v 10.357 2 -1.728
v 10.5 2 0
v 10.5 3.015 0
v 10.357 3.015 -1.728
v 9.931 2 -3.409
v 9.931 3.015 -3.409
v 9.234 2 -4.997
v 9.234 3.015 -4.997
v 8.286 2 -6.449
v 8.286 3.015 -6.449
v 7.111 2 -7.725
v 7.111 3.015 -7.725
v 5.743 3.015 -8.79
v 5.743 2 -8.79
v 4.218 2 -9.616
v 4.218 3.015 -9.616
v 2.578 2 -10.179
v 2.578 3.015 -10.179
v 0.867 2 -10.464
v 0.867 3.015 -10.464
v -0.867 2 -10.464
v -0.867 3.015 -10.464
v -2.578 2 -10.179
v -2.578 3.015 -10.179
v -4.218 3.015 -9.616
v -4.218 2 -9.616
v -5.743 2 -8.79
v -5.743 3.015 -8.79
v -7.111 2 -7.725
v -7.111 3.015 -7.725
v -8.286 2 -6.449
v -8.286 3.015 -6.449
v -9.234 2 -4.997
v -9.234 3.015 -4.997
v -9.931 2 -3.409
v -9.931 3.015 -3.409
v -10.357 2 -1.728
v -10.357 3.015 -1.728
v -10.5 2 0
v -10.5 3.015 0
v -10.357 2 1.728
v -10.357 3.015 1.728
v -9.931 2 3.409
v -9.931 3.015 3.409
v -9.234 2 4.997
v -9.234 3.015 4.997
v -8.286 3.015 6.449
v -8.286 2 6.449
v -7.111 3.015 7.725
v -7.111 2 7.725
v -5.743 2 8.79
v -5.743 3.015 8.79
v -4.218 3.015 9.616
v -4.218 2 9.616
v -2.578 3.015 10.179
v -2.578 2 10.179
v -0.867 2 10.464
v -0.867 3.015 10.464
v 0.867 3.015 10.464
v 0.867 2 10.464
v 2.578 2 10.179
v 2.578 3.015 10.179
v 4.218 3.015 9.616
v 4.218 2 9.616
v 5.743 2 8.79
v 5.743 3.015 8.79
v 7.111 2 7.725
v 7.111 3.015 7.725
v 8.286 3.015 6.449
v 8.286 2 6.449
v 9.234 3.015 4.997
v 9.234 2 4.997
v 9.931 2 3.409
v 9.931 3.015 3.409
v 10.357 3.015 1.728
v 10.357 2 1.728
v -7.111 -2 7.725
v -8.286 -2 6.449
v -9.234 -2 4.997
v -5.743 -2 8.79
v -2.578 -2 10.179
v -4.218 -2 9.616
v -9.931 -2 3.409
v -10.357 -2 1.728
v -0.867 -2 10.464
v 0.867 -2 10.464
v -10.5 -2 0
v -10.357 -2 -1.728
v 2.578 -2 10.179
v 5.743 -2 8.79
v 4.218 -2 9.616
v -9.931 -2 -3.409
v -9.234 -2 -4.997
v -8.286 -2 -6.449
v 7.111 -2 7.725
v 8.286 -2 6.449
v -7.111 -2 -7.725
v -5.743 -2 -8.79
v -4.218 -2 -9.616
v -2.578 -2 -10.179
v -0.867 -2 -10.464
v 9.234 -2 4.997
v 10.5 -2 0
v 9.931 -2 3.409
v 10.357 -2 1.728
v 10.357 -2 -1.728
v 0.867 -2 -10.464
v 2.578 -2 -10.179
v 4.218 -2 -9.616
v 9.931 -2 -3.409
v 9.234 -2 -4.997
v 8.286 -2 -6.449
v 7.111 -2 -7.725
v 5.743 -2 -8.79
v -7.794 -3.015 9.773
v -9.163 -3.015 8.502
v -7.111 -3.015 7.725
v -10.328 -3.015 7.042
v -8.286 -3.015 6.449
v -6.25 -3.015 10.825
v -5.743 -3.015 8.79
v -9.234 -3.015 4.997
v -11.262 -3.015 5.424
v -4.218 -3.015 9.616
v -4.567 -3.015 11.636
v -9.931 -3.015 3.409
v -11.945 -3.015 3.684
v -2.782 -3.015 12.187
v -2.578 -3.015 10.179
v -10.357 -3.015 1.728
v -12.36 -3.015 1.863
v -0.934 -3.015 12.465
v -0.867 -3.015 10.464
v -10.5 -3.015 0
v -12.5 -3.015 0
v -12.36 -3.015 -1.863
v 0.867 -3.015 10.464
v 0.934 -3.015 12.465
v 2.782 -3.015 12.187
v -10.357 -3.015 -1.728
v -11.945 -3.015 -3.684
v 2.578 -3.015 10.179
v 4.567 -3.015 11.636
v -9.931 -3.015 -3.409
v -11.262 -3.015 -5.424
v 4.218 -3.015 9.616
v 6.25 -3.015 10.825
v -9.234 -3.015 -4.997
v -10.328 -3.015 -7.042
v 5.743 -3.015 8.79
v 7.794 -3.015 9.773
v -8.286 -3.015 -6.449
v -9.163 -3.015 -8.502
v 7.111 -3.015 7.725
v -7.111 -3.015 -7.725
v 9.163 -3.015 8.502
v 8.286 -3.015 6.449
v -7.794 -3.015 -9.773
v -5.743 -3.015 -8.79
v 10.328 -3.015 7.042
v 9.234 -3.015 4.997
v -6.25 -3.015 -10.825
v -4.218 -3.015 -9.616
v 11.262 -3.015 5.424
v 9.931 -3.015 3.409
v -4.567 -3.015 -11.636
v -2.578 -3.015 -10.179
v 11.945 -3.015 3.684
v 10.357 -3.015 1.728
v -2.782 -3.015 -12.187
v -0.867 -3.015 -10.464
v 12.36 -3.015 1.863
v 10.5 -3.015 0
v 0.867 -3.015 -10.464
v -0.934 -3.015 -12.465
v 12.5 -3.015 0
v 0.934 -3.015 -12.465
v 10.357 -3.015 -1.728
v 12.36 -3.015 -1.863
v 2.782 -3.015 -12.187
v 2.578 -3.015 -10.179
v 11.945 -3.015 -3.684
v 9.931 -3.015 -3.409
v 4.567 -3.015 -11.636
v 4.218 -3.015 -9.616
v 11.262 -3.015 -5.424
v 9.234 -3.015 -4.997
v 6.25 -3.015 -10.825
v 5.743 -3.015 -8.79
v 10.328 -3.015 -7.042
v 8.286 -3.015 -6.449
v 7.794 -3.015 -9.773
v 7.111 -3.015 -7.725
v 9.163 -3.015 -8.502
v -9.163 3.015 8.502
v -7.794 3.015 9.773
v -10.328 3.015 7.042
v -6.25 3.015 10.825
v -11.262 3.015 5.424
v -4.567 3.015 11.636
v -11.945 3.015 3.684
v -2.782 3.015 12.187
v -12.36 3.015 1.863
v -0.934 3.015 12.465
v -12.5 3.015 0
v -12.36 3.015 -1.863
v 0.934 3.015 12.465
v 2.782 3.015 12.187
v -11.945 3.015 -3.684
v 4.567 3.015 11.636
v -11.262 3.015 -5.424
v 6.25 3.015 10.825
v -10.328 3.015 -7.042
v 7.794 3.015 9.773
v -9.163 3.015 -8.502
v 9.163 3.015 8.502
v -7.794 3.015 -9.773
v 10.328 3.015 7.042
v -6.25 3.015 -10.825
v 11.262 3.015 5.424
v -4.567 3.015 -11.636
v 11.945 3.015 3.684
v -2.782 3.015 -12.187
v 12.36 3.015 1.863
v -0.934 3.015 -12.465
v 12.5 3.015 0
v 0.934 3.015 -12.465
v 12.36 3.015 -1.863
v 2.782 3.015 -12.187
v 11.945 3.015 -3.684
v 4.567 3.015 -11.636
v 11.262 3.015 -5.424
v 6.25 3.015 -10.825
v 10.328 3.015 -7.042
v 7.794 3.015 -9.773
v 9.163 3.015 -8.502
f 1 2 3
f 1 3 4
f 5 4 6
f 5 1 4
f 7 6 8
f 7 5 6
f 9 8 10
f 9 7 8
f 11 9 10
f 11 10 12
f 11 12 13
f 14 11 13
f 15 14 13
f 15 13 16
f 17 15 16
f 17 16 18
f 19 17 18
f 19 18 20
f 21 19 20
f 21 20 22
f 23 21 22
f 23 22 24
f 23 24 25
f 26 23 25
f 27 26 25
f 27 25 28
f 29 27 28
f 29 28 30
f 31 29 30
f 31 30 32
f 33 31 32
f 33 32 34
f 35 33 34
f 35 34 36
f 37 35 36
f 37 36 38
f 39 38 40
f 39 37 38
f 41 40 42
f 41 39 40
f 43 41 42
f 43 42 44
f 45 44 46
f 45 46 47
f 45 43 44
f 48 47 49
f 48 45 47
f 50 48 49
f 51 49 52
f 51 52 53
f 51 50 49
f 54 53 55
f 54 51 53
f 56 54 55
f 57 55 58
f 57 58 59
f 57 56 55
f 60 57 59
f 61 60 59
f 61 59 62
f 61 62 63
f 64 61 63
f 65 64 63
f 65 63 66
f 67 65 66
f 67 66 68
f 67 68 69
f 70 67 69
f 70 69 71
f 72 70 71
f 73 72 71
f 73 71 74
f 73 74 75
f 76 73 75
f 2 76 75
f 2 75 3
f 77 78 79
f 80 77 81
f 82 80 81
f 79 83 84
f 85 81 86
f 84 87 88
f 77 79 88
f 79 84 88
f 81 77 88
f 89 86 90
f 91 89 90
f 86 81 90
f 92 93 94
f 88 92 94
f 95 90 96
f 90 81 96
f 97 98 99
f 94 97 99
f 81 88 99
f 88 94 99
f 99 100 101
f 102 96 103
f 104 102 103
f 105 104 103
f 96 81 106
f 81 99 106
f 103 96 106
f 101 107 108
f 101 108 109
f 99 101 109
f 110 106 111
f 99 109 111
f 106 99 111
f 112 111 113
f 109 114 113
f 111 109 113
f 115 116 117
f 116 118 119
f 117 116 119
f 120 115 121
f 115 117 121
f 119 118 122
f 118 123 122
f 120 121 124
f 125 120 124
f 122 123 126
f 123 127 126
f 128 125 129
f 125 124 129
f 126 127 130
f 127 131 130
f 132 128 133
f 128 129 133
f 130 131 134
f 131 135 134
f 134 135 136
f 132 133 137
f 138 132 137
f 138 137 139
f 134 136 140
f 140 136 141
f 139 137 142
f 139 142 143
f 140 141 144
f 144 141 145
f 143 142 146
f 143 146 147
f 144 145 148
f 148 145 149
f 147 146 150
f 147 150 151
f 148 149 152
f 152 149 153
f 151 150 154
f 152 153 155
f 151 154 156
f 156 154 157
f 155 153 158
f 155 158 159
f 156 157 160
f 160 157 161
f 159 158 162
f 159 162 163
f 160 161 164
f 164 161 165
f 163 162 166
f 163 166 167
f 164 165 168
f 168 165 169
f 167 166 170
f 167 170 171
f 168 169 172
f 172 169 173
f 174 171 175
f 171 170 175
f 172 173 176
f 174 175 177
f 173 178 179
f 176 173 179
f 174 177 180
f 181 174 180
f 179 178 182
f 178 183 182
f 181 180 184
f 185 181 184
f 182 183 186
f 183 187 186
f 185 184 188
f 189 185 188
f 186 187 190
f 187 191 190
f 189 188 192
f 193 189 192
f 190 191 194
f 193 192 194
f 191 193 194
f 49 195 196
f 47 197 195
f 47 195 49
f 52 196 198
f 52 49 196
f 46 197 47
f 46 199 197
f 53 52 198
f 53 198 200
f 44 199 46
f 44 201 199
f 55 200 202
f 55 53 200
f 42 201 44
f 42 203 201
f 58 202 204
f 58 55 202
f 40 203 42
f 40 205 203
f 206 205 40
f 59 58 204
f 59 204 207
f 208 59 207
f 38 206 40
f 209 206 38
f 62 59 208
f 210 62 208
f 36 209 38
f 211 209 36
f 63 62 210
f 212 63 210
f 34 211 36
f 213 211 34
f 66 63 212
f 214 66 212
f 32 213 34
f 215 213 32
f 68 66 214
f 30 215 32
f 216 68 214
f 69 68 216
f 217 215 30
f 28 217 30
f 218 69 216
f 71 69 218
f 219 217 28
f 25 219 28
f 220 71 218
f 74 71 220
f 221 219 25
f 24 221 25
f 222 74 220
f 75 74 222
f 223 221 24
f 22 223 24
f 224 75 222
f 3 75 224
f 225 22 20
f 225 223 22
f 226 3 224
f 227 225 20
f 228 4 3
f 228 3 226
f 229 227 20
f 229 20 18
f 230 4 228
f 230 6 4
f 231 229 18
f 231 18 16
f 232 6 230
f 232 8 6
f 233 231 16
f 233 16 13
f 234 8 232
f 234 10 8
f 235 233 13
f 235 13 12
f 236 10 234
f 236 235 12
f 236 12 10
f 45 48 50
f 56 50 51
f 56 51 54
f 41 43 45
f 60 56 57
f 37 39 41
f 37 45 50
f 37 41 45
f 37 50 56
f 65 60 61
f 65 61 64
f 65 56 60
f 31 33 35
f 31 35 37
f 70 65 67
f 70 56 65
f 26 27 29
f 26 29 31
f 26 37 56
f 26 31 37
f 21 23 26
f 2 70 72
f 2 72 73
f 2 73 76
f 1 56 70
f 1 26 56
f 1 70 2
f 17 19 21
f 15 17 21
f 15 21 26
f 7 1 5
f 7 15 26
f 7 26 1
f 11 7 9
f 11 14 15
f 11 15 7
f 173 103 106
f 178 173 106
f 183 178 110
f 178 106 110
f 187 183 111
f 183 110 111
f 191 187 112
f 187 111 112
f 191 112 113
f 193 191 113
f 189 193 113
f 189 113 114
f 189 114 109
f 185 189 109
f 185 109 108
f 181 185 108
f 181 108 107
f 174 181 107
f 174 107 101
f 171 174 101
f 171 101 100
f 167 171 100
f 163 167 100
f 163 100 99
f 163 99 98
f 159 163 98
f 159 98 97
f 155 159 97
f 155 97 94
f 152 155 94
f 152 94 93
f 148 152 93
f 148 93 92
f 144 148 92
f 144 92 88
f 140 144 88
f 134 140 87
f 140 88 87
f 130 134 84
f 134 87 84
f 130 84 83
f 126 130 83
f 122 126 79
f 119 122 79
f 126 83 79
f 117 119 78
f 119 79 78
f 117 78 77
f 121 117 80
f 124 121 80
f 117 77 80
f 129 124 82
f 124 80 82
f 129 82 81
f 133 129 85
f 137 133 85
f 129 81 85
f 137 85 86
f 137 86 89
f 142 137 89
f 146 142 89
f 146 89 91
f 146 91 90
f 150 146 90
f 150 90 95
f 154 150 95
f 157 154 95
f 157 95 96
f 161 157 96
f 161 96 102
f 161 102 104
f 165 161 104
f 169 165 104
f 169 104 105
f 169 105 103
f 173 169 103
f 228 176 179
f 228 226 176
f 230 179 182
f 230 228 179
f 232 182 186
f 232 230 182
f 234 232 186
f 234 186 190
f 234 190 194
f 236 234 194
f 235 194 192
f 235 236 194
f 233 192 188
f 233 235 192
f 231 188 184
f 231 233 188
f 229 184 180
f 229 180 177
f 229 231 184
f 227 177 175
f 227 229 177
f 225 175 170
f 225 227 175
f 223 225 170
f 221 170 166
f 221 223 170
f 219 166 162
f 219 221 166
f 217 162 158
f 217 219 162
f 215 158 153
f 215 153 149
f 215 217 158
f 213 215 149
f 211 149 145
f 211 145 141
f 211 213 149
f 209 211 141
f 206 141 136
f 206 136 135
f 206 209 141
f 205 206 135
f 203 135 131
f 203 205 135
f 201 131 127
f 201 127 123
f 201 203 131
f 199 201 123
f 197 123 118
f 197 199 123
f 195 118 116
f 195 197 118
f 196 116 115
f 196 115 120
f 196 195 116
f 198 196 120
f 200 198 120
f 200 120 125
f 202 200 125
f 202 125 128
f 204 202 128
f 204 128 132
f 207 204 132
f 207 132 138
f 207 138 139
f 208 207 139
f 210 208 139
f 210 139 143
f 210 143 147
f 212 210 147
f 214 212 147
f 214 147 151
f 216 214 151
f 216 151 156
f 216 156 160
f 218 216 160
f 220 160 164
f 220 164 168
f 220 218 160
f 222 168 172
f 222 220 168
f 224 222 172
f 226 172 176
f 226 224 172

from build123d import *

# Parameters (mm, degrees)
SKETCH1_R                = 10.5
BOSS_EXTRUDE1_DEPTH      = 2
BOSS_EXTRUDE2_START      = -2
SKETCH1_2_R              = 10.5
BOSS_EXTRUDE2_DEPTH      = 2
BOSS_EXTRUDE3_DEPTH      = 3.015
BOSS_EXTRUDE3_DEPTH_BACK = 3.015
SKETCH2_R                = 12.5
SKETCH2_R_2              = 10.5


with BuildPart() as part:
    # Sketch1 → Boss-Extrude1 (new body)
    with BuildSketch(Plane(origin=(0, 0, 0), x_dir=(1, 0, 0), z_dir=(0, 1, 0))):
        Circle(SKETCH1_R)
    extrude(amount=BOSS_EXTRUDE1_DEPTH)

    # Sketch1<2> → Boss-Extrude2 (add)
    with BuildSketch(Plane(origin=(0, 0, 0), x_dir=(1, 0, 0), z_dir=(0, 1, 0)).offset(BOSS_EXTRUDE2_START)):
        Circle(SKETCH1_2_R)
    extrude(amount=BOSS_EXTRUDE2_DEPTH)

    # Sketch2 → Boss-Extrude3 (add, two sides: drawn at the far end of the back side and taken through both)
    with BuildSketch(Plane(origin=(0, 0, 0), x_dir=(1, 0, 0), z_dir=(0, 1, 0)).offset(-BOSS_EXTRUDE3_DEPTH_BACK)):
        Circle(SKETCH2_R)
        Circle(SKETCH2_R_2, mode=Mode.SUBTRACT)
    extrude(amount=BOSS_EXTRUDE3_DEPTH + BOSS_EXTRUDE3_DEPTH_BACK)


solid = part.part
